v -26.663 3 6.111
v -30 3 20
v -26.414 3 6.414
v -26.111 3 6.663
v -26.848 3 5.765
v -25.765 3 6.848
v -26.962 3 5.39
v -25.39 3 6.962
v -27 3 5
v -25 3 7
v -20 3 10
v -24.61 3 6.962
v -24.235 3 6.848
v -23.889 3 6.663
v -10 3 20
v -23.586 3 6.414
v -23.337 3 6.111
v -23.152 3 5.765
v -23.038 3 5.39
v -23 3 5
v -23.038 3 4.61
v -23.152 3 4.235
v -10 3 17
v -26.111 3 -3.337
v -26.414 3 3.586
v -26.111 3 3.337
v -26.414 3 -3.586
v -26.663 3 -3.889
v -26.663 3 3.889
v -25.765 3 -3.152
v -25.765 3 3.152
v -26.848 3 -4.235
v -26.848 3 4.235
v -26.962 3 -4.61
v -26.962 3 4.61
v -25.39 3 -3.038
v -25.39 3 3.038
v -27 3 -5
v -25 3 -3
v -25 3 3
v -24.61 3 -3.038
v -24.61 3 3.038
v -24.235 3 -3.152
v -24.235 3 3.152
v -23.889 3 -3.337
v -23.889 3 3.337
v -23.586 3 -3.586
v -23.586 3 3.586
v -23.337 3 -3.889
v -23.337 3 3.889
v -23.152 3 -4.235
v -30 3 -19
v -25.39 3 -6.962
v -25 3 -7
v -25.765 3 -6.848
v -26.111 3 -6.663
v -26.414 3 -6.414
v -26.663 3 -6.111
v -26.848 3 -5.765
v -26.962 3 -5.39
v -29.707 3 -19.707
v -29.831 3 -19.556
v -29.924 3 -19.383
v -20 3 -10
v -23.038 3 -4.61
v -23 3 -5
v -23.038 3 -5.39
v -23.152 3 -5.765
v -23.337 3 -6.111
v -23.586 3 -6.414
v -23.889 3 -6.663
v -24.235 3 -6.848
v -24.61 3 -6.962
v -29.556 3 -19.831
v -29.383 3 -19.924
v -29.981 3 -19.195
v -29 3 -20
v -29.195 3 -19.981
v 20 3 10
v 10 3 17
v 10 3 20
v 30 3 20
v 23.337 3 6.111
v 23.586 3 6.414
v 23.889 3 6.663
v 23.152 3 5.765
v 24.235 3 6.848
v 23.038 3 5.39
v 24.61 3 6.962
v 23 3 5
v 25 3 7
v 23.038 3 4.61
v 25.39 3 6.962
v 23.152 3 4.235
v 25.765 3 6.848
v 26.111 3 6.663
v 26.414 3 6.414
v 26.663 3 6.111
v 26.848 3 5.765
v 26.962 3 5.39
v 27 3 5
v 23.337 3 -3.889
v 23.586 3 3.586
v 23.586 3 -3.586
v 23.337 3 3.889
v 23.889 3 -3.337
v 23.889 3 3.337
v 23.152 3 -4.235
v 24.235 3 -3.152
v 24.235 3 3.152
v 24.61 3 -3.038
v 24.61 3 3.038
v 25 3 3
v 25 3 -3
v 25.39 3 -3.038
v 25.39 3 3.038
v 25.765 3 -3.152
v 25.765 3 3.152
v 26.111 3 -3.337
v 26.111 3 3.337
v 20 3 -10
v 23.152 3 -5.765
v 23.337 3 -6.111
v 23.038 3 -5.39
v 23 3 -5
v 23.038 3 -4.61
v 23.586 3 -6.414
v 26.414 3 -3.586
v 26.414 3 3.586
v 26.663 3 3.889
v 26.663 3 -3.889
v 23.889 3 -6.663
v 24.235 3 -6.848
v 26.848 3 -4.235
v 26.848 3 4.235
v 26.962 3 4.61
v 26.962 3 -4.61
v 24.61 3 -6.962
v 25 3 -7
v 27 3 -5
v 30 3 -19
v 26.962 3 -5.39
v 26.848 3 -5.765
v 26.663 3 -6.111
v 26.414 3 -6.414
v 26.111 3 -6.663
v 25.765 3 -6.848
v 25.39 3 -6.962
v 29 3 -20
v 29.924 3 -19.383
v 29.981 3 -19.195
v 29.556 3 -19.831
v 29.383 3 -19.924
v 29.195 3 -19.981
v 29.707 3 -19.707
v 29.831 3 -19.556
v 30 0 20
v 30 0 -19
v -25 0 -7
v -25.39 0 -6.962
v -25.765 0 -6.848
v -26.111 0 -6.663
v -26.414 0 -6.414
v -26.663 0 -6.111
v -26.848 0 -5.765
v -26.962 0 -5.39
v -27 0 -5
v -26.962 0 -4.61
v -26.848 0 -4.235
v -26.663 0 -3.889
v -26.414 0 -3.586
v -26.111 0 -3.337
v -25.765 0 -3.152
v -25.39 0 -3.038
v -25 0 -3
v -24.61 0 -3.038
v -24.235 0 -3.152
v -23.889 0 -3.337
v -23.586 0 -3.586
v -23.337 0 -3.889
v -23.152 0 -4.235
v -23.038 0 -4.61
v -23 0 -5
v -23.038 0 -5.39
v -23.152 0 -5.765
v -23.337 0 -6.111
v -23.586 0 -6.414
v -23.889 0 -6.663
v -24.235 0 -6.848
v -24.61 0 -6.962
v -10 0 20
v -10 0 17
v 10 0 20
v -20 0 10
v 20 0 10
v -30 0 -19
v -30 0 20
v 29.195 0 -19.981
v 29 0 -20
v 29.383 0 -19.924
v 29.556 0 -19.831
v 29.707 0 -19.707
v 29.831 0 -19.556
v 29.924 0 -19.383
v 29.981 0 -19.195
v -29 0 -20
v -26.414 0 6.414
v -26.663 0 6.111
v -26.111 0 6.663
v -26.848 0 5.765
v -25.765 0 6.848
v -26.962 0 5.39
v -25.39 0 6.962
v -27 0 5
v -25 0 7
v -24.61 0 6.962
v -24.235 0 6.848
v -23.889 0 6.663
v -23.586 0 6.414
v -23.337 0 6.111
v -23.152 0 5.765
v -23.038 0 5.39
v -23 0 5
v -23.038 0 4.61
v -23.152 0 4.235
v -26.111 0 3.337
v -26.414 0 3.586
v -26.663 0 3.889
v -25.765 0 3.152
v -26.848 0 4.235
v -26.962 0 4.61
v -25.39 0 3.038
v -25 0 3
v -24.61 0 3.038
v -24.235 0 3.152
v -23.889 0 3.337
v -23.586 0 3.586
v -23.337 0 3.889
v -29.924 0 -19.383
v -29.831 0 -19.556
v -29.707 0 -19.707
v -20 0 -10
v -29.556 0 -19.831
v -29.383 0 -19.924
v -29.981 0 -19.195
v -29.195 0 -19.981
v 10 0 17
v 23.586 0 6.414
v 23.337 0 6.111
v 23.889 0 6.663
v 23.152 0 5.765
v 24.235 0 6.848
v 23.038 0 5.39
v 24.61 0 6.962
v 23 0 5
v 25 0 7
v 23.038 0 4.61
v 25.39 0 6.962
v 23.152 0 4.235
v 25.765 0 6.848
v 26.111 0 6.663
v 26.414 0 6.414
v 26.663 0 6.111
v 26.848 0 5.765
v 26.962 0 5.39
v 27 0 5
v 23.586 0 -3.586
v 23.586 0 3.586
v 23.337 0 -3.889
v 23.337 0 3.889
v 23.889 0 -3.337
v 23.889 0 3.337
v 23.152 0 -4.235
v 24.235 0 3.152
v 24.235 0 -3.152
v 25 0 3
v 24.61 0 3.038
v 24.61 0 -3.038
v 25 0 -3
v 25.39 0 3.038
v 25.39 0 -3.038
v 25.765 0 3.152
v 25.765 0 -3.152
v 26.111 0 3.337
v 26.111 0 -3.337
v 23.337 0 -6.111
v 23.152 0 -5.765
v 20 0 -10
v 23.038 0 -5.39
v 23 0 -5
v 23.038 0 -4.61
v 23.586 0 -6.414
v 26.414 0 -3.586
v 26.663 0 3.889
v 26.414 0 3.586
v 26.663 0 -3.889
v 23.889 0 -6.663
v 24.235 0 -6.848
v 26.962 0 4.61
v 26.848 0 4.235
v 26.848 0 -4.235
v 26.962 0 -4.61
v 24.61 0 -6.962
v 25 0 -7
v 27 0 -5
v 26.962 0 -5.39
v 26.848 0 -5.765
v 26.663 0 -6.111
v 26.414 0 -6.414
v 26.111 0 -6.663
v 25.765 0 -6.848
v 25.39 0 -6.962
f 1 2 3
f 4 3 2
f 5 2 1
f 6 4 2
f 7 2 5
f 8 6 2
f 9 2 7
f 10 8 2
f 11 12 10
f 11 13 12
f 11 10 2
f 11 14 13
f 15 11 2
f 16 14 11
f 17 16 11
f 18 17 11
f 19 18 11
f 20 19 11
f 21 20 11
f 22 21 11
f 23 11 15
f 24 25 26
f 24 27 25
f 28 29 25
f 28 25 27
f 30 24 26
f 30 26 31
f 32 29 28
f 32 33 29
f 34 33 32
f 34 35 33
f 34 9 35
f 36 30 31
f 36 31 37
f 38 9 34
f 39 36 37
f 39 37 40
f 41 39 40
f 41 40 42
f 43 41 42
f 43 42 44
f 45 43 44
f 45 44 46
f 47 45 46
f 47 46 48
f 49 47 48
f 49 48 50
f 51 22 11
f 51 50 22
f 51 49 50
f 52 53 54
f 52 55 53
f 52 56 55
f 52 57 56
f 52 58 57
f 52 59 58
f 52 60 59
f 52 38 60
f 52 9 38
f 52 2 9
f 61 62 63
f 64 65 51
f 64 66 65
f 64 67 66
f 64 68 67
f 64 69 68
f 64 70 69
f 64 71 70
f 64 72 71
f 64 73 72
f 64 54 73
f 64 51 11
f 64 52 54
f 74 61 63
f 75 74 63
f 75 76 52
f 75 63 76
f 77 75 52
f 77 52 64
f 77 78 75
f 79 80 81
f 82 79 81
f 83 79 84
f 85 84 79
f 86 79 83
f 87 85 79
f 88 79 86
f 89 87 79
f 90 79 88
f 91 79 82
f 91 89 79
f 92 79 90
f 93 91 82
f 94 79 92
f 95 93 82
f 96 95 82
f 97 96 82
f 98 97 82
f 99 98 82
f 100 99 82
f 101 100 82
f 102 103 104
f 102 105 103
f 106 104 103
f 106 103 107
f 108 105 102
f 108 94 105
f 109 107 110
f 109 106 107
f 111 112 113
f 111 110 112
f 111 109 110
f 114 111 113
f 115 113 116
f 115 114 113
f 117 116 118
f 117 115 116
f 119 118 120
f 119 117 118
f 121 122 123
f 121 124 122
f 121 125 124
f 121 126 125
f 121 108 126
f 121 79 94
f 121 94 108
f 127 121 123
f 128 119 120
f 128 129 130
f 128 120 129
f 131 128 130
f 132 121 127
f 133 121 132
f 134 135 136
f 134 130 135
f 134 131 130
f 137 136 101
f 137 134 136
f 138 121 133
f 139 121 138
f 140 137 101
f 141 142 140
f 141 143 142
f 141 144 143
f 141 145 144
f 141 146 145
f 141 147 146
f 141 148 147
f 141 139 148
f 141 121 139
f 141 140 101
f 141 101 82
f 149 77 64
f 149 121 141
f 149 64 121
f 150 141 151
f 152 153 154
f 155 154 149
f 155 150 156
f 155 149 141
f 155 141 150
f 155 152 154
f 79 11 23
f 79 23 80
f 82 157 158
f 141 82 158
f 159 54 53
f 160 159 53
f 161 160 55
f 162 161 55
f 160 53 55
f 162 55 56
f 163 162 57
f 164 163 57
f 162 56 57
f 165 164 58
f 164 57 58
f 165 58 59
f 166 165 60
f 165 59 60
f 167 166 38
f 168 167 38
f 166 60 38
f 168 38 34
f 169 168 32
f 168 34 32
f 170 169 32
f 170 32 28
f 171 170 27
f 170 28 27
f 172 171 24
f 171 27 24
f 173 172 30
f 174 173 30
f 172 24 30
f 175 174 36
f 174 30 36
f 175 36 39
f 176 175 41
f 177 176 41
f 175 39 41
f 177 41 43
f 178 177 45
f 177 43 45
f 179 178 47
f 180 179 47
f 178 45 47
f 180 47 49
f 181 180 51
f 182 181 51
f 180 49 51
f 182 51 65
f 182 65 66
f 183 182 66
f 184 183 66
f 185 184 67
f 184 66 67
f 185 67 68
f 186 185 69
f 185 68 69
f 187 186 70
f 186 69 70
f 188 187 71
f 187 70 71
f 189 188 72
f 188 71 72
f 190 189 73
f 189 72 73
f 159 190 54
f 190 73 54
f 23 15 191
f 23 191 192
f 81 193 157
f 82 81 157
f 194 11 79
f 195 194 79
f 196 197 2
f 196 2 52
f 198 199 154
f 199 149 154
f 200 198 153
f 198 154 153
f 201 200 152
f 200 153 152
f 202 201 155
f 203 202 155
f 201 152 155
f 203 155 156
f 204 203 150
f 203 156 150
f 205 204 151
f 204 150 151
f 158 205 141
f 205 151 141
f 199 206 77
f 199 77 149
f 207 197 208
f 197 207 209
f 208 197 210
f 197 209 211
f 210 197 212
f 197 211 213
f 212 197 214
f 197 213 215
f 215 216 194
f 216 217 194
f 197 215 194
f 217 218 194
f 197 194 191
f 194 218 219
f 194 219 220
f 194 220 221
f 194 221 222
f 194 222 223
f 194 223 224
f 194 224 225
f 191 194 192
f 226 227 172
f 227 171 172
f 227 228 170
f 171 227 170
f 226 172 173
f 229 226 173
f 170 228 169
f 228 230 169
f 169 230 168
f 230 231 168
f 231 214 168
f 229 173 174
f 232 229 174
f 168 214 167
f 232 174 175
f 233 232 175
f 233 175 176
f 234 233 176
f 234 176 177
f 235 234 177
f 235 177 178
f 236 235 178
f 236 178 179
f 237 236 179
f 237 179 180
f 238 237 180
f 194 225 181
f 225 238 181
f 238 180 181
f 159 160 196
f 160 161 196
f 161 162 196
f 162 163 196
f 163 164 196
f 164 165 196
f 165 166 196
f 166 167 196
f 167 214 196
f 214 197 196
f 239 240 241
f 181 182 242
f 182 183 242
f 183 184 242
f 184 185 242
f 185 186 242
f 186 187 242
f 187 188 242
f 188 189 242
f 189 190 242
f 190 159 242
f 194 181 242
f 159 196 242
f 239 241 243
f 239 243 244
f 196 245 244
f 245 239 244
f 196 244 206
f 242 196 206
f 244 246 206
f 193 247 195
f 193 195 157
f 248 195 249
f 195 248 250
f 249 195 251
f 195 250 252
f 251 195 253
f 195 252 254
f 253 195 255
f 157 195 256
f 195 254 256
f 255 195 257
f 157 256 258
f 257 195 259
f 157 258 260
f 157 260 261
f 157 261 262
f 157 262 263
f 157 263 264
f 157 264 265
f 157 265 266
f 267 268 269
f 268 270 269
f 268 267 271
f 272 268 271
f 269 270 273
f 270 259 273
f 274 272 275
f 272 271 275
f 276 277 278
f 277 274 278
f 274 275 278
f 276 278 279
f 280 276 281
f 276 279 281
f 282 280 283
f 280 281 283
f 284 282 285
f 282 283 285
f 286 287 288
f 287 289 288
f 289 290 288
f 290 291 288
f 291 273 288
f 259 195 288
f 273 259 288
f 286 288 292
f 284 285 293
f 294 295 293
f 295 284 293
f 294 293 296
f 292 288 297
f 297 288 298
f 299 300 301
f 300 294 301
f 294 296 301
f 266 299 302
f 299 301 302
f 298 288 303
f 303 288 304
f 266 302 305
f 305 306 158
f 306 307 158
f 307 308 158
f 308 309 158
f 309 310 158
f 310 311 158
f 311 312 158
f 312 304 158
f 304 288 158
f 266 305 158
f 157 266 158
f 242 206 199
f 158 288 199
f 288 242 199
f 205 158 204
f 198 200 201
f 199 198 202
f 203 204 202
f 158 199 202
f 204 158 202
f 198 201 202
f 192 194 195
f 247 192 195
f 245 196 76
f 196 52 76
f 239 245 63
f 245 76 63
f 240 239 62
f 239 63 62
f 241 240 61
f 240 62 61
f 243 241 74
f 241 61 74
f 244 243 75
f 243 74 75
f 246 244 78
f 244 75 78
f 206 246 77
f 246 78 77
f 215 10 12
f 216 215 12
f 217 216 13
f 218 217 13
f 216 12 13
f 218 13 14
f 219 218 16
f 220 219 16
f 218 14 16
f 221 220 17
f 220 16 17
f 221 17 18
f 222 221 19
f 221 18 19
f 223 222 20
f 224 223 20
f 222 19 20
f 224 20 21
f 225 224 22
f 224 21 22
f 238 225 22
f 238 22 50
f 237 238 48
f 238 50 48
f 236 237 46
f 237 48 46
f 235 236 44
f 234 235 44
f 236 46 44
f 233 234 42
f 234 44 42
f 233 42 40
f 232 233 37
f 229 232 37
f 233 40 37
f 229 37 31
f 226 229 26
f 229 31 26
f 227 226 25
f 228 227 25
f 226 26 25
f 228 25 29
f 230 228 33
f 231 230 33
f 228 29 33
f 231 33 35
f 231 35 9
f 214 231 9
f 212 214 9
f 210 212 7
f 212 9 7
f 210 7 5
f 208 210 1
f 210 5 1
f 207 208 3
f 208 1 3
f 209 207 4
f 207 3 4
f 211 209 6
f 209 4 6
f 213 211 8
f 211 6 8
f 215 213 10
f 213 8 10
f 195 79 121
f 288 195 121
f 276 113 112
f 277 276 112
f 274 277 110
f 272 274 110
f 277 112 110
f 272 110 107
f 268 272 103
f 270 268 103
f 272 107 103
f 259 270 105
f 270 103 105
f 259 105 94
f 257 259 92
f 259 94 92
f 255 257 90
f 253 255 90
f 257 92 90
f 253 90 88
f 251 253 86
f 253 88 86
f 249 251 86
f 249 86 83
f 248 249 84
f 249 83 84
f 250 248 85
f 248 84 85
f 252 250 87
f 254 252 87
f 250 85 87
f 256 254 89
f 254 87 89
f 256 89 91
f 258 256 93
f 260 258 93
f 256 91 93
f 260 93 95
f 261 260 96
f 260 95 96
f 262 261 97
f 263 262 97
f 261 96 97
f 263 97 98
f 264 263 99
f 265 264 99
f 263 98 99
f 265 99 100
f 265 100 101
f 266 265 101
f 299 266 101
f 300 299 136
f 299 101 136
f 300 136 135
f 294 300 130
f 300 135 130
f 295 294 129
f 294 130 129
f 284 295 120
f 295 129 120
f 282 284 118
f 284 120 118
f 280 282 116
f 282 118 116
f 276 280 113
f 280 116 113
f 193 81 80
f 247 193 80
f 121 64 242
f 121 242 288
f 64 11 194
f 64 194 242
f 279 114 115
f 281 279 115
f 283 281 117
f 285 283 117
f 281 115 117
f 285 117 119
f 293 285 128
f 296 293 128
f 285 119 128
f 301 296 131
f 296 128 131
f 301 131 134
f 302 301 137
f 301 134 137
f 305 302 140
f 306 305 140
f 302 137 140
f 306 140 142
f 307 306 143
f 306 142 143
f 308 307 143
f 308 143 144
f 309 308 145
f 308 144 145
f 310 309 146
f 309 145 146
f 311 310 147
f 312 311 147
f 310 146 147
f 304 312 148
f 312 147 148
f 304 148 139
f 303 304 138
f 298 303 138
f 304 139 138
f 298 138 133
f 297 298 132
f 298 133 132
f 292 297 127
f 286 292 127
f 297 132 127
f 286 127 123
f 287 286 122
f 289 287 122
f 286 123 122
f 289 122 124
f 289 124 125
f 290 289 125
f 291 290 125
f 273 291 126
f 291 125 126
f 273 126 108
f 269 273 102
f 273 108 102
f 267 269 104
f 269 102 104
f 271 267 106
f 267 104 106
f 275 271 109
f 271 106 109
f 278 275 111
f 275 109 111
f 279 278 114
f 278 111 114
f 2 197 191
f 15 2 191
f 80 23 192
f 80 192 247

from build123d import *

# Parameters (mm, degrees)
SKETCH1_W           = 60
SKETCH1_H           = 40
BOSS_EXTRUDE1_DEPTH = 3
SKETCH2_W           = 40
SKETCH2_H           = 20
CUT_EXTRUDE1_DEPTH  = 3
SKETCH3_R           = 2
CUT_EXTRUDE2_DEPTH  = 3
FILLET2_R           = 1
SKETCH4_W           = 20
SKETCH4_H           = 6
CUT_EXTRUDE3_DEPTH  = 3


with BuildPart() as part:
    # Sketch1 → Boss-Extrude1 (new body)
    with BuildSketch(Plane(origin=(0, 0, 0), x_dir=(1, 0, 0), z_dir=(0, 1, 0))):
        Rectangle(SKETCH1_W, SKETCH1_H)
    extrude(amount=BOSS_EXTRUDE1_DEPTH)

    # Sketch2 → Cut-Extrude1 (cut)
    with BuildSketch(Plane(origin=(0, 3, 0), x_dir=(1, 0, 0), z_dir=(0, 1, 0))):
        Rectangle(SKETCH2_W, SKETCH2_H)
    extrude(amount=-CUT_EXTRUDE1_DEPTH, mode=Mode.SUBTRACT)

    # Sketch3 → Cut-Extrude2 (cut)
    with BuildSketch(Plane(origin=(0, 3, 0), x_dir=(1, 0, 0), z_dir=(0, 1, 0))):
        with Locations(Location((25, 5, 0), (0, 0, 270))):
            Circle(SKETCH3_R)
        with Locations(Location((25, -5, 0), (0, 0, 90))):
            Circle(SKETCH3_R)
        with Locations(Location((-25, -5, 0), (0, 0, 270))):
            Circle(SKETCH3_R)
        with Locations(Location((-25, 5, 0), (0, 0, 90))):
            Circle(SKETCH3_R)
    extrude(amount=-CUT_EXTRUDE2_DEPTH, mode=Mode.SUBTRACT)

    # Fillet2
    fillet2_edges = [part.edges().sort_by_distance(p)[0] for p in [
        (-30, 1.5, -20),
        (30, 1.5, -20),
    ]]
    fillet(fillet2_edges, radius=FILLET2_R)

    # Sketch4 → Cut-Extrude3 (cut)
    with BuildSketch(Plane(origin=(0, 3, 0), x_dir=(1, 0, 0), z_dir=(0, 1, 0))):
        with Locations((0, -20)):
            Rectangle(SKETCH4_W, SKETCH4_H)
    extrude(amount=-CUT_EXTRUDE3_DEPTH, mode=Mode.SUBTRACT)


solid = part.part
